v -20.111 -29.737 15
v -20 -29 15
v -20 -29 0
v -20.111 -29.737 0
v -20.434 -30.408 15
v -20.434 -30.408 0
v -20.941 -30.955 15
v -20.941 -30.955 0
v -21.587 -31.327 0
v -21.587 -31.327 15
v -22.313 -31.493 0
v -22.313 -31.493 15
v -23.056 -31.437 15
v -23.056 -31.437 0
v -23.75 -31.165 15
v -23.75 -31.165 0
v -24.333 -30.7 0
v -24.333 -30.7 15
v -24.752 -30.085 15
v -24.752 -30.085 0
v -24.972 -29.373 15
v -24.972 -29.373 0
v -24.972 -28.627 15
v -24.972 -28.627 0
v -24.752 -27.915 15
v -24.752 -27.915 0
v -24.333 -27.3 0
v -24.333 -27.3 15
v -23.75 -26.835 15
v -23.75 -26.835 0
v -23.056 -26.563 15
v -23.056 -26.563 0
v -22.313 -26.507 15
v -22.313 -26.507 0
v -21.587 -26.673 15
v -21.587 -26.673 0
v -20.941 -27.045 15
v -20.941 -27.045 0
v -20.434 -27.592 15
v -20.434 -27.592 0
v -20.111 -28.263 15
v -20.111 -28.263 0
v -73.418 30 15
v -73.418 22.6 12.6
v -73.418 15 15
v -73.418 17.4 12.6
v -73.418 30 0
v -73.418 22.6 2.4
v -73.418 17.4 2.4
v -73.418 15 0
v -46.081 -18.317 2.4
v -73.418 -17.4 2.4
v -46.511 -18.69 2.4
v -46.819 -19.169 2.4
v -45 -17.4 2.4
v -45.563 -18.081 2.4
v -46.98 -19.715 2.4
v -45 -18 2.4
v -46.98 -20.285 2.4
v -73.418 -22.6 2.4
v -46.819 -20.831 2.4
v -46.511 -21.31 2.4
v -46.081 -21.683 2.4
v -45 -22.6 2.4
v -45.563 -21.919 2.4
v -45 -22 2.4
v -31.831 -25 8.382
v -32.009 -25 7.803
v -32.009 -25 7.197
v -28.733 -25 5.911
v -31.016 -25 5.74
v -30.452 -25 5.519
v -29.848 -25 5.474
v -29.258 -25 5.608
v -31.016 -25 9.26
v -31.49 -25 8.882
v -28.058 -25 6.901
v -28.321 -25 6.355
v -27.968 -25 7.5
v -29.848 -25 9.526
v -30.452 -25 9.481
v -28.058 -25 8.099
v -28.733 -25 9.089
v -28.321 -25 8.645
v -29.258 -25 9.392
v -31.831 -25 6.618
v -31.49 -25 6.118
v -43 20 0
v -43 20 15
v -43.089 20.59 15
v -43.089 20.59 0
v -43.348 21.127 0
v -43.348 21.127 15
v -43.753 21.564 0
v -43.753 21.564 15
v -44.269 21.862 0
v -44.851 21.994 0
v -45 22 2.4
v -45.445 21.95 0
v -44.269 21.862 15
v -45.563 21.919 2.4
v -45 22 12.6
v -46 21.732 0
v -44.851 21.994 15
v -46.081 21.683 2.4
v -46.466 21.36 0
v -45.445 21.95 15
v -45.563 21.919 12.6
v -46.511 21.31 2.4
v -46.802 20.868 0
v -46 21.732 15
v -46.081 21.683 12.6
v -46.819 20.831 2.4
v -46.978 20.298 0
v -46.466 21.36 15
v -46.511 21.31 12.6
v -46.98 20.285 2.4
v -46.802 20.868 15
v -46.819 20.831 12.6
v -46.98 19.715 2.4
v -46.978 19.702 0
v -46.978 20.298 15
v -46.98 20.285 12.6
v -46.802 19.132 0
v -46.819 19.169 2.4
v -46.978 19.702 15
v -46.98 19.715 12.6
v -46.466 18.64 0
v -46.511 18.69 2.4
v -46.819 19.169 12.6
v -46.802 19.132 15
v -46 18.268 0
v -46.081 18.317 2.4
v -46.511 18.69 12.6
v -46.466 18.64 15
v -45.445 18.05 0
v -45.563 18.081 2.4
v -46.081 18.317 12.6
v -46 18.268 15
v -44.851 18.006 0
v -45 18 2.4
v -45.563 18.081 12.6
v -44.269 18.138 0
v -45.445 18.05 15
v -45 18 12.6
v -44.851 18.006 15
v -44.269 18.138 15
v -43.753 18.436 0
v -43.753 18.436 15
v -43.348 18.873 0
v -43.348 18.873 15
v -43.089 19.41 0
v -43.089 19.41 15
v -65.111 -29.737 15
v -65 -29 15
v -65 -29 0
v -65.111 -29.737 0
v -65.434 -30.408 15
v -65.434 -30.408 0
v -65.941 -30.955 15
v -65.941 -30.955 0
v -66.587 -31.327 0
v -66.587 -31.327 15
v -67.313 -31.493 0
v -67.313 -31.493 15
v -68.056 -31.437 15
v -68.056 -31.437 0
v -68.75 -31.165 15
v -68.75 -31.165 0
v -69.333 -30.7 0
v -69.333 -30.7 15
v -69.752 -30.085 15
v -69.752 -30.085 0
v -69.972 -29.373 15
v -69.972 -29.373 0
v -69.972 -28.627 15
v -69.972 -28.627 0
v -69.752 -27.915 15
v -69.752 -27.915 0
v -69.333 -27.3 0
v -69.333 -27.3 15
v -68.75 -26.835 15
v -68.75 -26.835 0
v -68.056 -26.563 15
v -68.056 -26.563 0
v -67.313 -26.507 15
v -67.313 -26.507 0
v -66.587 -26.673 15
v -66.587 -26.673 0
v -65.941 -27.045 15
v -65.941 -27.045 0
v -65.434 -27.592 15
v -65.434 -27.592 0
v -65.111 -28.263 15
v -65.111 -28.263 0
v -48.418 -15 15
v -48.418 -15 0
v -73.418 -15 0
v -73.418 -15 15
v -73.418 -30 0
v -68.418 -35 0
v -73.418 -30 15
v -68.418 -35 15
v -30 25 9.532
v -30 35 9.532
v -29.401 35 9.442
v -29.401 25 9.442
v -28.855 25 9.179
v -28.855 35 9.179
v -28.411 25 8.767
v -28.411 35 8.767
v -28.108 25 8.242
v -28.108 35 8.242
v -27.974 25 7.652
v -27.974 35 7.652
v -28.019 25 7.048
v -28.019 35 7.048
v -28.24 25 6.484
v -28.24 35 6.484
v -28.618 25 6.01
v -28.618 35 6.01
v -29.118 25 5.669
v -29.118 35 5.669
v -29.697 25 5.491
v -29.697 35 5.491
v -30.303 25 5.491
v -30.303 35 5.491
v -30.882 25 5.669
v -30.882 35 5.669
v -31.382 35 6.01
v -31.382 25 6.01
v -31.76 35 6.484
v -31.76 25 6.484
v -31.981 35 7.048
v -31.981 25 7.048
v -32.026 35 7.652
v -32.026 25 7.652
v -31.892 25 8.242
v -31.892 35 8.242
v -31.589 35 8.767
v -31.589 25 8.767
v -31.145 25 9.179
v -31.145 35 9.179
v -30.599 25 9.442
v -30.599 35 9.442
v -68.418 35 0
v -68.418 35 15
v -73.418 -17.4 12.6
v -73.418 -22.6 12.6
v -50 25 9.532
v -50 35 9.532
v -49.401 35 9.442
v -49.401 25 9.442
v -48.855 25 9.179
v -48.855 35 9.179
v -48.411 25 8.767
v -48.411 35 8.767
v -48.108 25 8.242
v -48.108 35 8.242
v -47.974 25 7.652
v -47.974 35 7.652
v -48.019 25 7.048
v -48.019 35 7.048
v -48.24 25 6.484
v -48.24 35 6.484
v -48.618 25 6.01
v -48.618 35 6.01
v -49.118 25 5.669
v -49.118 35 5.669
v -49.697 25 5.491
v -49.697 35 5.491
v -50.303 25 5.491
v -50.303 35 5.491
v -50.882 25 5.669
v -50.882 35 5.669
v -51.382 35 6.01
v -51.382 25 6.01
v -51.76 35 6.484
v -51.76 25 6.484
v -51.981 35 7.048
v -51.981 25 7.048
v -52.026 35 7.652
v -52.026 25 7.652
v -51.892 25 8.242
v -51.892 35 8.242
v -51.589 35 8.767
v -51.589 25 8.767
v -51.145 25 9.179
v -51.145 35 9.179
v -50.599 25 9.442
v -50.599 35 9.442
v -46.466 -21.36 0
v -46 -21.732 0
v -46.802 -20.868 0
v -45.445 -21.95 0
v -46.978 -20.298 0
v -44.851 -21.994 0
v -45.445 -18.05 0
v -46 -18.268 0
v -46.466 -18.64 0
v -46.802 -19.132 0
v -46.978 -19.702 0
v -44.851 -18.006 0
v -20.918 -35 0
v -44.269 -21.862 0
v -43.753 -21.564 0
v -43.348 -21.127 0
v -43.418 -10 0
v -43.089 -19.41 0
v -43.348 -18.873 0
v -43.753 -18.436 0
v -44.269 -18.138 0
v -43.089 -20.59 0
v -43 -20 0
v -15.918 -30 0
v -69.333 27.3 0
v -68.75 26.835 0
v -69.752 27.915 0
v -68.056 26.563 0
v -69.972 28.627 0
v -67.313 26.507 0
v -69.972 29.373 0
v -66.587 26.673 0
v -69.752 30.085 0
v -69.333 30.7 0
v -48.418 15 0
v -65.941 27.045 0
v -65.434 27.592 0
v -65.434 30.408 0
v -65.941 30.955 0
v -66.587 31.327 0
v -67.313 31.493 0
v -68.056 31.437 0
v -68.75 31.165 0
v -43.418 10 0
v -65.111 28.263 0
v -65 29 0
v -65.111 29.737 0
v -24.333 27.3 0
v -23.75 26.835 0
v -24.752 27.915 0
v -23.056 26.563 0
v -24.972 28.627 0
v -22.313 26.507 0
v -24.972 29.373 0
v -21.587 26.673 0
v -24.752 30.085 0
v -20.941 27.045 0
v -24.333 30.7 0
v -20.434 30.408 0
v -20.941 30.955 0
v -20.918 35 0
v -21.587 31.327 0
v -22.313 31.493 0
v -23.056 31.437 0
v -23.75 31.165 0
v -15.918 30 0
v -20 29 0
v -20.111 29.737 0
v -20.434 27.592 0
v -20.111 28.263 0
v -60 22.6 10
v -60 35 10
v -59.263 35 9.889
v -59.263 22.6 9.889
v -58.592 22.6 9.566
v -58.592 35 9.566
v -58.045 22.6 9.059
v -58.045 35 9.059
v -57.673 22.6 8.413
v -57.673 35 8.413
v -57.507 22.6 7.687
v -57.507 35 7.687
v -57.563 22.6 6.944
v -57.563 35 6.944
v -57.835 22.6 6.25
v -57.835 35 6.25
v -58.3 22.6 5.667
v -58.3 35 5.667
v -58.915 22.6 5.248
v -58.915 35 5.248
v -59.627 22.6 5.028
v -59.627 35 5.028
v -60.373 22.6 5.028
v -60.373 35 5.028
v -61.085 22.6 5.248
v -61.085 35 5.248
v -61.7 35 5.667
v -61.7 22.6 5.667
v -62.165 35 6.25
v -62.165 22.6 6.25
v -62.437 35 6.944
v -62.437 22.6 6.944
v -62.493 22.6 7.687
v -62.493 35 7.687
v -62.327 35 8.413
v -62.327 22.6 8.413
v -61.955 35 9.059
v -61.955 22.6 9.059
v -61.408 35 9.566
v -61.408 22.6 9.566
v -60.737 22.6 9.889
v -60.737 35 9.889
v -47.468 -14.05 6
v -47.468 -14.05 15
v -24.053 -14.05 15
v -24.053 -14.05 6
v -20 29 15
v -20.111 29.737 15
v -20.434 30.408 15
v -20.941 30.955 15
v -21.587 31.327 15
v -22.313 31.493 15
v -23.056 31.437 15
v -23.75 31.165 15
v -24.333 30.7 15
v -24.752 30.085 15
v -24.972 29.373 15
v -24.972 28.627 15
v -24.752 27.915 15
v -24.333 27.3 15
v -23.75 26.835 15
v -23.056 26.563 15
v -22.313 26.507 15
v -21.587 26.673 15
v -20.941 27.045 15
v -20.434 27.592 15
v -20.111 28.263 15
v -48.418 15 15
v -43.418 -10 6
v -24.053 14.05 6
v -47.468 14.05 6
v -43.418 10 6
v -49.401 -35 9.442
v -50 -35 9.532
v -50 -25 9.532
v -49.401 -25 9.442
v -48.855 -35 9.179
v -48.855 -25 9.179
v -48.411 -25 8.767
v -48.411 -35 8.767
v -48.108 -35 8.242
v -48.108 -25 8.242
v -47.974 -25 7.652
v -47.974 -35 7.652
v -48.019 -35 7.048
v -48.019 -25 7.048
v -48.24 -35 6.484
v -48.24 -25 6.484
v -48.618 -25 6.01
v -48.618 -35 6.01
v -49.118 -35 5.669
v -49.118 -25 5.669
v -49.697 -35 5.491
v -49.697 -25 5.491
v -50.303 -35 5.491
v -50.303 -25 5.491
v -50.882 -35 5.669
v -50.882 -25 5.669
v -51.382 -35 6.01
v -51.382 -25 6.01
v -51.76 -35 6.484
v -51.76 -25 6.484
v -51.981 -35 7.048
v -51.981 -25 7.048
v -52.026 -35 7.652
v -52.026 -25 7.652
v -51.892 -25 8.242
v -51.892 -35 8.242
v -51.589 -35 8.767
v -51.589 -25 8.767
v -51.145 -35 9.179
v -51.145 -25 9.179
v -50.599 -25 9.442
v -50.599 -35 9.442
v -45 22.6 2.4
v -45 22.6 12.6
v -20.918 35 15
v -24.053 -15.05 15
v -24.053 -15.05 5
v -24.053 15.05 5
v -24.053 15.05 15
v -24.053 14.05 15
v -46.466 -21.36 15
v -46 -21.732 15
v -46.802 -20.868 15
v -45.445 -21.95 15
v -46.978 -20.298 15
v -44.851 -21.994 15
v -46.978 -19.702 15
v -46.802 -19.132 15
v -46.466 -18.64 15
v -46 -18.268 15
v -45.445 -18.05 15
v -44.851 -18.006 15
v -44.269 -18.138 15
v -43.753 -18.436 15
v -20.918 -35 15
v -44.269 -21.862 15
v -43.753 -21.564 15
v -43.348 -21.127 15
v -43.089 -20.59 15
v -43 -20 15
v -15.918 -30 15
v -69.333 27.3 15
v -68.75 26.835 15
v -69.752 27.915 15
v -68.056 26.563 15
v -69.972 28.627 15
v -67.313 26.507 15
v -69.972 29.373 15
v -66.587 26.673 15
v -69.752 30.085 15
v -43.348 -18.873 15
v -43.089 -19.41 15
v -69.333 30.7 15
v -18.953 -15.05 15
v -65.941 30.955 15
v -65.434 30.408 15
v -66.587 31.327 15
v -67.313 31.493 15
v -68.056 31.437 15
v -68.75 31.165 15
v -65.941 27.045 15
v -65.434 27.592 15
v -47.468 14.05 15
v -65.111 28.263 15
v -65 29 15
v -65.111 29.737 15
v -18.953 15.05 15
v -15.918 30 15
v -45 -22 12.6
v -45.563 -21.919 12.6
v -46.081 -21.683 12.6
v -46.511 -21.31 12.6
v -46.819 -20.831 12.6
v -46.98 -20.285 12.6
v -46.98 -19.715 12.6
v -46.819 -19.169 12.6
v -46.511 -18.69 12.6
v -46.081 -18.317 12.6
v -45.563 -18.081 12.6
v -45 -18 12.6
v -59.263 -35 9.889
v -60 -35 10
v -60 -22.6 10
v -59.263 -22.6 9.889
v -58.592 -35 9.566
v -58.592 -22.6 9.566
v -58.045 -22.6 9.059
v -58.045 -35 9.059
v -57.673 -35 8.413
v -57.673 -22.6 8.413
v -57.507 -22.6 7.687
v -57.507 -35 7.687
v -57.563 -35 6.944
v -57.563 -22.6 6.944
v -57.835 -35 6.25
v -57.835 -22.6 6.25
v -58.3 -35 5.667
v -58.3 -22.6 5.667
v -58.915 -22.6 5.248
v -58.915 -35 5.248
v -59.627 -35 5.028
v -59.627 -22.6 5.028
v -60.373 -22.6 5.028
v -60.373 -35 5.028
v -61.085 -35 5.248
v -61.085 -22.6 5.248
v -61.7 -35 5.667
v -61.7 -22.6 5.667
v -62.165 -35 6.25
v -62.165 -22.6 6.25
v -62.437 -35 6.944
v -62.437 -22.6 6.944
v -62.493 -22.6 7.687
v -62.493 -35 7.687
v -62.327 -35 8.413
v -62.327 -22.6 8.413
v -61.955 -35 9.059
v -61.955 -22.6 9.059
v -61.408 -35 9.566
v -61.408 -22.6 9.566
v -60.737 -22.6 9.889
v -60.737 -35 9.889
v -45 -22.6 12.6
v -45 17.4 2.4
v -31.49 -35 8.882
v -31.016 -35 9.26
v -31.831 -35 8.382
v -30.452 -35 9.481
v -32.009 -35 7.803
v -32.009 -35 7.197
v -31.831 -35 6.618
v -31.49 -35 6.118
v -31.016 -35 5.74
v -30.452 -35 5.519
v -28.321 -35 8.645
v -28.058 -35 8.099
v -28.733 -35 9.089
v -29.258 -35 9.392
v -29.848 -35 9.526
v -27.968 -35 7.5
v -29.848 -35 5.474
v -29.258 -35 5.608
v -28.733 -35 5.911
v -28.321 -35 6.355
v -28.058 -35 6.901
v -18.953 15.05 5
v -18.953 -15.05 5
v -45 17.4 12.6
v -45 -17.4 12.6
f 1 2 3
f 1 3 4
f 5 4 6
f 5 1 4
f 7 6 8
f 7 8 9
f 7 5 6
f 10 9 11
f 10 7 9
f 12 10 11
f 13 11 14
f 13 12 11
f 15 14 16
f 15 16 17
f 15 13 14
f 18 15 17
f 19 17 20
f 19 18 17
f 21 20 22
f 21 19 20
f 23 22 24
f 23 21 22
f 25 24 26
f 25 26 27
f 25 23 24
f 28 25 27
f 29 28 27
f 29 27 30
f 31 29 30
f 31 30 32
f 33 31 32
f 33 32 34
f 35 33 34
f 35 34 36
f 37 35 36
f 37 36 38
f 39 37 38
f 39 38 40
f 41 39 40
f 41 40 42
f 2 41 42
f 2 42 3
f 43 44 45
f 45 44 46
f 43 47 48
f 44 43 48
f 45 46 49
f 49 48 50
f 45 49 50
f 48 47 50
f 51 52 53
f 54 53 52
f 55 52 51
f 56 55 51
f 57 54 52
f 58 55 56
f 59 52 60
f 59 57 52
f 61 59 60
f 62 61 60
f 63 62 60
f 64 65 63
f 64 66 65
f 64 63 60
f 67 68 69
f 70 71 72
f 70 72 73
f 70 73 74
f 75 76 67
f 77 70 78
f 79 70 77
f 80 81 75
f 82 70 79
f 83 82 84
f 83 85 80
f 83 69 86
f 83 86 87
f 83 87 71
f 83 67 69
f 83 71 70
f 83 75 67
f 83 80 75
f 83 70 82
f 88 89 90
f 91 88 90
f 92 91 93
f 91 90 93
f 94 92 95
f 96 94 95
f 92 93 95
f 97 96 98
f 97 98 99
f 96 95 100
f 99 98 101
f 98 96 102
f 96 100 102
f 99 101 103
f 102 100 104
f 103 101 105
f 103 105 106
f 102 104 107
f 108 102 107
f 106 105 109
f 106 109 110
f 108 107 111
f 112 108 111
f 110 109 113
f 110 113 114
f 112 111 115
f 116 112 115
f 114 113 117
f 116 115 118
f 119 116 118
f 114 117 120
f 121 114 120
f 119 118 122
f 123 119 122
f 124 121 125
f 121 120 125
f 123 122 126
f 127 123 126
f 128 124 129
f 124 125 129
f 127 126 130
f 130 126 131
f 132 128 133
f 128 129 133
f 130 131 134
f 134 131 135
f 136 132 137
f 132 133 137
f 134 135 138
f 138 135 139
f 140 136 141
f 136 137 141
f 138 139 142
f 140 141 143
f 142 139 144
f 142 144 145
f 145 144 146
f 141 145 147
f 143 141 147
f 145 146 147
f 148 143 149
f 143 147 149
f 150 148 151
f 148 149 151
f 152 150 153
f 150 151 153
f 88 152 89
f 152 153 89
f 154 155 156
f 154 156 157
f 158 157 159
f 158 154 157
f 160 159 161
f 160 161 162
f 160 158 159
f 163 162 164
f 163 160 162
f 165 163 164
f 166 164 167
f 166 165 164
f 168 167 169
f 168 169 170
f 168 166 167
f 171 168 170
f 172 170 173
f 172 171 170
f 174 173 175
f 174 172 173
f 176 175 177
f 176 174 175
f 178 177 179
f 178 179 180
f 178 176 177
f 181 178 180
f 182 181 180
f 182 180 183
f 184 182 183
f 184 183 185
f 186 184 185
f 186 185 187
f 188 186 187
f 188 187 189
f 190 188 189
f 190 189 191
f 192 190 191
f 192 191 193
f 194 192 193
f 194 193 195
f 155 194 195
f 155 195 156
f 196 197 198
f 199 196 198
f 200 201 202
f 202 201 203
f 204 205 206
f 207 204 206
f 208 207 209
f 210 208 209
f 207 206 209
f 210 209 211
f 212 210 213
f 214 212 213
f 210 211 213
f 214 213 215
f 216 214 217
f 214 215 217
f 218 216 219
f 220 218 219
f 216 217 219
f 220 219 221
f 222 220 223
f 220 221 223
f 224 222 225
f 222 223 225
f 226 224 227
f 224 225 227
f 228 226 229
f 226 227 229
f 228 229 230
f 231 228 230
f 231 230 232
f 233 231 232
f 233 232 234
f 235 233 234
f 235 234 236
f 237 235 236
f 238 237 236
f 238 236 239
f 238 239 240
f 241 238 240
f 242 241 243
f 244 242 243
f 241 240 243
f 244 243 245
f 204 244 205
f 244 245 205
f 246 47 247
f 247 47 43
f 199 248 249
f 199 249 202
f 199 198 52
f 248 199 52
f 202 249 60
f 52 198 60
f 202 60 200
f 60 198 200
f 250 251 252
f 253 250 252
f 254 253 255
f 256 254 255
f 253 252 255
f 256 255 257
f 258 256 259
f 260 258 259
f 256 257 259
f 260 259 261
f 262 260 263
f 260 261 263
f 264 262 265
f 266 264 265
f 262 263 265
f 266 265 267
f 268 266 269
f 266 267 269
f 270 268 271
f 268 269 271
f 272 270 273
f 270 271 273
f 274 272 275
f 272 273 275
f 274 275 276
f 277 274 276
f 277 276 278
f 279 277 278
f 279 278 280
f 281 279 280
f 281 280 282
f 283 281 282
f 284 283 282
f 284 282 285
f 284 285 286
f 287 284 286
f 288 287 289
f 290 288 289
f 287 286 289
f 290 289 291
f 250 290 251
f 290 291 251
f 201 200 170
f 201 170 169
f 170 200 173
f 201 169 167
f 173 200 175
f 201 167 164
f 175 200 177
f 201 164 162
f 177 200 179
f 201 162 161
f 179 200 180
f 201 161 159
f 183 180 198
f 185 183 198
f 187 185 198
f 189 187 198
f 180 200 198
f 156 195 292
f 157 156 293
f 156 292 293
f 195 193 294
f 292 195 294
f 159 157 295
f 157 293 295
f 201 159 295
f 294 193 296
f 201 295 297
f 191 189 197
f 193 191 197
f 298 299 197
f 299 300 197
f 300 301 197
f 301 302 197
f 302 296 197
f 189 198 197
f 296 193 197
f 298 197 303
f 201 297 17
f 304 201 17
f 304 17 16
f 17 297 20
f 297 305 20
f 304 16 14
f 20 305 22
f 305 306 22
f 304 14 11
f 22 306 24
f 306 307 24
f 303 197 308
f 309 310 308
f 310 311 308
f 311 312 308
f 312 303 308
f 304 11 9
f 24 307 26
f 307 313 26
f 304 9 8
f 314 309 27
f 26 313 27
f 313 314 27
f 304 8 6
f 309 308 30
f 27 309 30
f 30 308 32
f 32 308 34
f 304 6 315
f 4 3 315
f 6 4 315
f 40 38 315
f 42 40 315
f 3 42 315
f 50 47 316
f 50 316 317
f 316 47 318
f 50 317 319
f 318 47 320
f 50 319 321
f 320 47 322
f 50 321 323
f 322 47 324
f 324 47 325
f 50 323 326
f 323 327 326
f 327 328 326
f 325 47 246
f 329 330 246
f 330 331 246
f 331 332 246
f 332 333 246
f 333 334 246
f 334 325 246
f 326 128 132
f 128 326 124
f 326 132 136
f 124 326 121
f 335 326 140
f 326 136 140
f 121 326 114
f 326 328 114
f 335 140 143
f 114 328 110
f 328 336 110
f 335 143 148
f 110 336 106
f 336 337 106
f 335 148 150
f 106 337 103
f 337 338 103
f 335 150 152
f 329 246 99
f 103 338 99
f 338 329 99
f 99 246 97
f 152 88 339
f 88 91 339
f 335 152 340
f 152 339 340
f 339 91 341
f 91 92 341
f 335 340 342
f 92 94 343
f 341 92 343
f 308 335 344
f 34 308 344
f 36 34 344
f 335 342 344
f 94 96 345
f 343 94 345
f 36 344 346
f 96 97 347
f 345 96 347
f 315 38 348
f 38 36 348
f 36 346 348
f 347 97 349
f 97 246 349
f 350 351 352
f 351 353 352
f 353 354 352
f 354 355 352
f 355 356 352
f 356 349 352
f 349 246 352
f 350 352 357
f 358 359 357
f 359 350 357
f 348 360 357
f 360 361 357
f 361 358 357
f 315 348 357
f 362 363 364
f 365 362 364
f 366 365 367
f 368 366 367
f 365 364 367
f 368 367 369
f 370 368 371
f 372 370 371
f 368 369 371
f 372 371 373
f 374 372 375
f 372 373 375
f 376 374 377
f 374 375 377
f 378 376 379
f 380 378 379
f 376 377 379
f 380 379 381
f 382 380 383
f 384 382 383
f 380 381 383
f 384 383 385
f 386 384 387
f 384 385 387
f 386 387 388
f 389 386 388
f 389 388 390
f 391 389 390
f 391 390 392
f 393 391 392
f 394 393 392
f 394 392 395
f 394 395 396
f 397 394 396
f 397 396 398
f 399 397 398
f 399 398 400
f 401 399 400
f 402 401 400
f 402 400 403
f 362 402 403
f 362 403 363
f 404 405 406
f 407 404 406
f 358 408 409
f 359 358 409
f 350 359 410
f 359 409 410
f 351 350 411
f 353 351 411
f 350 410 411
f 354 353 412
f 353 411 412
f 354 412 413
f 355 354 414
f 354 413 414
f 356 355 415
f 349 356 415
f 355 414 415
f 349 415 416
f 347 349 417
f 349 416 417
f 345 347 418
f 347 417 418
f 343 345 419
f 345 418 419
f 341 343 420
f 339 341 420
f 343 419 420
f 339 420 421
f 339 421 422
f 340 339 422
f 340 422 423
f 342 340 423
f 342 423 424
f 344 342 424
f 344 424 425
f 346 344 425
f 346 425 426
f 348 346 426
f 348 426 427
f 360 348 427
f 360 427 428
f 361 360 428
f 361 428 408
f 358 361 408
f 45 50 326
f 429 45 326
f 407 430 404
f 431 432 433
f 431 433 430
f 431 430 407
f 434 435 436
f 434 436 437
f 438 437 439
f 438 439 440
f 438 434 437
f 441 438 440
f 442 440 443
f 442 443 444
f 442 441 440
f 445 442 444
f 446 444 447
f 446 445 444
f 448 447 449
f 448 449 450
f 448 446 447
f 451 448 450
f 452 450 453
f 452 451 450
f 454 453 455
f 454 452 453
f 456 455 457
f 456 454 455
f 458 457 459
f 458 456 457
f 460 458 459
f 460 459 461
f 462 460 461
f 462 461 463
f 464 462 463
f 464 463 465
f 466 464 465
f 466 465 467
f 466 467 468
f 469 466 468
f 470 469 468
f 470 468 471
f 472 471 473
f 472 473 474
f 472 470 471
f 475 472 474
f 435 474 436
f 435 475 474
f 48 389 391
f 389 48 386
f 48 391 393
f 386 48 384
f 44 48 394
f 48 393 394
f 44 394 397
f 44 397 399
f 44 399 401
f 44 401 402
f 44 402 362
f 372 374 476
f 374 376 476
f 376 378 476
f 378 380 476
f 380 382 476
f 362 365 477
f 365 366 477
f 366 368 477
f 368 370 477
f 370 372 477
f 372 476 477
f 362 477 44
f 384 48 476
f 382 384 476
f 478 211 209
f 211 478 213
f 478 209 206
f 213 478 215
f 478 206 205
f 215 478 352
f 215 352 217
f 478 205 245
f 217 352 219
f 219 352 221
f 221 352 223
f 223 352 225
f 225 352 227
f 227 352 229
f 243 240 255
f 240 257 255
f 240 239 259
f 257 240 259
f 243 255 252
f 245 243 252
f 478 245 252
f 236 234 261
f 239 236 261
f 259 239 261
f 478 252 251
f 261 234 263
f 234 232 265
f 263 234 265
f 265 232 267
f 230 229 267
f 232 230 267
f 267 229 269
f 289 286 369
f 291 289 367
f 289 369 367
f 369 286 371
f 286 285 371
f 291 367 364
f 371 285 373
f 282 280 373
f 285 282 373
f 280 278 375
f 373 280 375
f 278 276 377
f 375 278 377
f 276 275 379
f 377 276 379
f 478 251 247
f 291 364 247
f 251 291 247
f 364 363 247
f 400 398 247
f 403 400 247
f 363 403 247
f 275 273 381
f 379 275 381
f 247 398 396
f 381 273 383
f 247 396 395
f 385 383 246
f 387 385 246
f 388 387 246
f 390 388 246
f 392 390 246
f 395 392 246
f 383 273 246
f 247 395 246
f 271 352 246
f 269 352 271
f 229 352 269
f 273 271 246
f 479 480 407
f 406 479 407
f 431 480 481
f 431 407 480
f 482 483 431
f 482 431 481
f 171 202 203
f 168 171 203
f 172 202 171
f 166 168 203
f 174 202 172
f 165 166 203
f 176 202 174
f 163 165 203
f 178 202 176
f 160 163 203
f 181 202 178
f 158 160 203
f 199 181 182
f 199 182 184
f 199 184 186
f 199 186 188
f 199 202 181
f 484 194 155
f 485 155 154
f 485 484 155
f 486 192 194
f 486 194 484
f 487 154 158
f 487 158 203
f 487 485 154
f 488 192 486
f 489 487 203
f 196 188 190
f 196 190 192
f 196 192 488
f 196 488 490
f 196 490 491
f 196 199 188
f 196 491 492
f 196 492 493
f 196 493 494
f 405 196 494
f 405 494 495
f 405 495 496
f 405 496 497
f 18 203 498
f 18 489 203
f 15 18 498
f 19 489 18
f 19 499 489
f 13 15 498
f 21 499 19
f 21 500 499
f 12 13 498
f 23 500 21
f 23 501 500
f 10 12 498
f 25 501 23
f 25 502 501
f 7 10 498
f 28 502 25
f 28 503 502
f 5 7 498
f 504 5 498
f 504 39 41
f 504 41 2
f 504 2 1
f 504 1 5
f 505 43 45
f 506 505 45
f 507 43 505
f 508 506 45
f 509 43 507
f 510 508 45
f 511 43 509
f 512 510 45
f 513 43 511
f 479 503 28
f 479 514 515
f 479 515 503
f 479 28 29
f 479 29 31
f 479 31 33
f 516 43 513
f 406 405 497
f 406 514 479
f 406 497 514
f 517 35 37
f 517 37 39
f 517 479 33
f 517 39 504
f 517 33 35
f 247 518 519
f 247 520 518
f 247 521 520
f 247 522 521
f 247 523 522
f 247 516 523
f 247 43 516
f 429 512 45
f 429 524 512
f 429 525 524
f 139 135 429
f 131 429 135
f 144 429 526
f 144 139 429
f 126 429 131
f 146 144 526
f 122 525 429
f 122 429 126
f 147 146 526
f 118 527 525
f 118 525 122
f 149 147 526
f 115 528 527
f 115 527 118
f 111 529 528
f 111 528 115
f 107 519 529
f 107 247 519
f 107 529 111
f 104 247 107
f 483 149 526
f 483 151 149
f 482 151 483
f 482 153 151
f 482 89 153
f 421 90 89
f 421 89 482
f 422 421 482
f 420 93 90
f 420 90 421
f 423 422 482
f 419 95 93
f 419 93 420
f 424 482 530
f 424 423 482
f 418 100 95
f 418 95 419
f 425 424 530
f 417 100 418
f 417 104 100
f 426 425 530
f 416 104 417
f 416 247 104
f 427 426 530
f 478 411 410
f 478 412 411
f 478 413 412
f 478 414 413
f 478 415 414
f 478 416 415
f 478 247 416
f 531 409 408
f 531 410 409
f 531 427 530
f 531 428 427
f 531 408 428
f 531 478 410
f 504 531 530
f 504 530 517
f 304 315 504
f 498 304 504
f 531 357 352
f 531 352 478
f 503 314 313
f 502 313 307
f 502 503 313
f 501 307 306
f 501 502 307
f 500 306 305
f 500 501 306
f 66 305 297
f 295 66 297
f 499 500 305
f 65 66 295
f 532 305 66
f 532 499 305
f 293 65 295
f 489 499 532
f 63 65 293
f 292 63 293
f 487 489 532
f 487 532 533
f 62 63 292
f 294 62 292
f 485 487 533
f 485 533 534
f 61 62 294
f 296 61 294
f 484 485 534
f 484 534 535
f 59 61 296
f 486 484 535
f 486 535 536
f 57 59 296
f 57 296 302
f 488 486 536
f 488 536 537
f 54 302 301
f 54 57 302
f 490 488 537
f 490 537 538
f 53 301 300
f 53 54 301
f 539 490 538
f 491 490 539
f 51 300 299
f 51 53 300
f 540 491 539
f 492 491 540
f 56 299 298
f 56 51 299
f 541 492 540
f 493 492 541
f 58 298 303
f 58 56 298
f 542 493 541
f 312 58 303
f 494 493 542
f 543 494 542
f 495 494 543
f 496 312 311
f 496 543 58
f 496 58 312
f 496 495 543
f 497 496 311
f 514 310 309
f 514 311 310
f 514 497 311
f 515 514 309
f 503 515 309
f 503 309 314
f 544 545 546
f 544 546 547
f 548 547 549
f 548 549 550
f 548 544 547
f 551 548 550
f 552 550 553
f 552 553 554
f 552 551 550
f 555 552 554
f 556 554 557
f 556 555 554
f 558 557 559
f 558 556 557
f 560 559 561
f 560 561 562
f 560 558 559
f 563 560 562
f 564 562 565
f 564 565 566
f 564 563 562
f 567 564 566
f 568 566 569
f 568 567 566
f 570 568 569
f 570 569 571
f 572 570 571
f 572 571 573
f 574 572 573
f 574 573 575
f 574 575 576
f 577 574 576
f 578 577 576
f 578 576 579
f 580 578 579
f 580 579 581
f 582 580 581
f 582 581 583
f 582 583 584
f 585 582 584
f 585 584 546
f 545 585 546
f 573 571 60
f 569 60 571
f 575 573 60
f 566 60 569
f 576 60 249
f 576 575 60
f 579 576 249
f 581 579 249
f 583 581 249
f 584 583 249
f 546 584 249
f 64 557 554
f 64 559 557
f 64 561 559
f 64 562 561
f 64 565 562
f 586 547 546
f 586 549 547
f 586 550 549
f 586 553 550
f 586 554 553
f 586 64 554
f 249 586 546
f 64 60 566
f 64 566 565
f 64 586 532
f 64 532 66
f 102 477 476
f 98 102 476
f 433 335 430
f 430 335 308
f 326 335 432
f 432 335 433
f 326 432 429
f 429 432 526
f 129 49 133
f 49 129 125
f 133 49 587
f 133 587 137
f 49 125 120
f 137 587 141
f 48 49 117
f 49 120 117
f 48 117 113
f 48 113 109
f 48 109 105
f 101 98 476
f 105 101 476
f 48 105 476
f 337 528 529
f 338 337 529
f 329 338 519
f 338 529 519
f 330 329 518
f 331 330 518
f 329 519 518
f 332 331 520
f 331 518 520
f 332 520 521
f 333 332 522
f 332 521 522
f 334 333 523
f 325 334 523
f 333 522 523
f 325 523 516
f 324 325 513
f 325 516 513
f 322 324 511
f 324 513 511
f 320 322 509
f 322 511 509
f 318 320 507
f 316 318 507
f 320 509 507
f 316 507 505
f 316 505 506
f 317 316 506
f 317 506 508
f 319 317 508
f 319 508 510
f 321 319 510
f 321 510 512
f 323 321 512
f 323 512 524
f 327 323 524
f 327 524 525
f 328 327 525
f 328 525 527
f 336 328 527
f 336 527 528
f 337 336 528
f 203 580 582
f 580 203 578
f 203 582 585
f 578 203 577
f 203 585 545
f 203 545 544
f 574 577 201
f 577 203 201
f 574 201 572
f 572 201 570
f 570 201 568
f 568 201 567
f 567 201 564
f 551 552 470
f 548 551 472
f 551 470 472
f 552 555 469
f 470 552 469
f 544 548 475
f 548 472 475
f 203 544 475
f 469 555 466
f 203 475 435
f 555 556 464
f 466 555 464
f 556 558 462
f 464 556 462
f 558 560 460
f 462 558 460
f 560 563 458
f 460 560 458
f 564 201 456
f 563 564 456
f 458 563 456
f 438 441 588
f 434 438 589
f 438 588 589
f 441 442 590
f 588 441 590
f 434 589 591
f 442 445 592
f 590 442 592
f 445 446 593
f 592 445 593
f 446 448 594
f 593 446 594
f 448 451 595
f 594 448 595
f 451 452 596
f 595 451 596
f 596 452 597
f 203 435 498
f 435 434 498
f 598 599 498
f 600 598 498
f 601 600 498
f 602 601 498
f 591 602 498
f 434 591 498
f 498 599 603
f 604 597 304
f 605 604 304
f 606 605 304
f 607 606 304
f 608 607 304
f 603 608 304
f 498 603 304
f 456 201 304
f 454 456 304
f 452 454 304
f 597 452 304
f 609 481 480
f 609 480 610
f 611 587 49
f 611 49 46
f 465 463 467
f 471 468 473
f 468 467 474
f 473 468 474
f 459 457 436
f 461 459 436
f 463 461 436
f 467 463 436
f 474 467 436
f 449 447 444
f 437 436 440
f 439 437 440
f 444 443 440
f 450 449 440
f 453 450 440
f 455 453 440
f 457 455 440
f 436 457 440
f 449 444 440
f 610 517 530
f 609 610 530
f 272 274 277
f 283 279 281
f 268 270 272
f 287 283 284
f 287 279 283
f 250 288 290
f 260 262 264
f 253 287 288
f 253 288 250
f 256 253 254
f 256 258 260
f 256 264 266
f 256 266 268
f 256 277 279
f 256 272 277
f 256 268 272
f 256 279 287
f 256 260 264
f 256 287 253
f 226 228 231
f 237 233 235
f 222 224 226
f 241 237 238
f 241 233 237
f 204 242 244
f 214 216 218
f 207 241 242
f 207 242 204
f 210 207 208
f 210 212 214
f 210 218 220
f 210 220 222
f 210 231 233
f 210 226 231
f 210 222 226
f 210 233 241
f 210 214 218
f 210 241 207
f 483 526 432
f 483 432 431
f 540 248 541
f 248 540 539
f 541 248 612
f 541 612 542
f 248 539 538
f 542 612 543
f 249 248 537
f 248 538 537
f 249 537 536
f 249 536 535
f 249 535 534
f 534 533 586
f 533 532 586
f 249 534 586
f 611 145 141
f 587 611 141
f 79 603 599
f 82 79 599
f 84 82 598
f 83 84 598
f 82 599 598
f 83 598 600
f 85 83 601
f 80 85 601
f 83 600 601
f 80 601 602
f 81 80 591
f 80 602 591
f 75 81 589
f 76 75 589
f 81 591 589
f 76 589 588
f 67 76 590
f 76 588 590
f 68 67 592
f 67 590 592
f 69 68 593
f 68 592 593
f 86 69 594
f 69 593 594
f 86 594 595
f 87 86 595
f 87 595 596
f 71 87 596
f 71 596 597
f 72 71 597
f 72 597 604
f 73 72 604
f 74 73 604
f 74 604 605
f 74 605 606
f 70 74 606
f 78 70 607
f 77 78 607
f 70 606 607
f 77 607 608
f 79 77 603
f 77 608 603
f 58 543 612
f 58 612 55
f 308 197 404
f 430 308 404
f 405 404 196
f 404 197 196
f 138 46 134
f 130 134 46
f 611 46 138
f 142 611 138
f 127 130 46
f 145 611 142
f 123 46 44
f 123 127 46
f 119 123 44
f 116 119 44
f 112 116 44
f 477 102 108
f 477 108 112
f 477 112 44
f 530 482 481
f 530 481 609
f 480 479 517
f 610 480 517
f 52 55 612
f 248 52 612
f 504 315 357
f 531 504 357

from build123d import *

# Parameters (mm, degrees)
EXTRUDE_2_DEPTH          = 15
CHAMFER_1_SIZE           = 5
CUT_EXTRUDE_START        = -13.418191
SKETCH_16_W              = 10.2
SKETCH_16_H              = 5.2
CUT_EXTRUDE_11_DEPTH     = 13.418191
SKETCH_17_W              = 10.2
SKETCH_17_H              = 5.2
CUT_EXTRUDE_12_DEPTH     = 15
SKETCH_19_R              = 2
CUT_EXTRUDE_13_DEPTH     = 83.70568747
CUT_EXTRUDE_14_REACH     = 104.544
SKETCH_21_R              = 2.5
SKETCH_24_R              = 2.032005788
CUT_EXTRUDE_16_DEPTH     = 10
PATTERN_LINEAR_1_COUNT   = 2
PATTERN_LINEAR_1_PITCH   = 20
CUT_EXTRUDE_20_REACH     = 84.706
SKETCH_31_R              = 2.5
MIRROR_1_COPY_1_SKETCH_R = 2.032005788
MIRROR_1_COPY_1_DEPTH    = 10
SKETCH_28_W              = 5.1
SKETCH_28_H              = 30.1
CUT_EXTRUDE_18_DEPTH     = 10
SKETCH_29_W              = 33.808551472
SKETCH_29_H              = 28.1
CUT_EXTRUDE_19_DEPTH     = 9


with BuildPart() as part:
    # 草圖1 → 填料-伸長2 (new body)
    with BuildSketch(Plane.XY):
        Polygon((-15.918190797, 35), (-73.418190797, 35), (-73.418190797, 15), (-43.418190797, 15), (-43.418190797, -15), (-73.418190797, -15), (-73.418190797, -35), (-15.918190797, -35), align=None)
    extrude(amount=EXTRUDE_2_DEPTH)

    # 導角1
    chamfer_1_edges = [part.edges().sort_by_distance(p)[0] for p in [
        (-73.418190797, 35, 7.5),
        (-15.918190797, 35, 7.5),
        (-15.918190797, -35, 7.5),
        (-73.418190797, -35, 7.5),
        (-43.418190797, -15, 7.5),
        (-43.418190797, 15, 7.5),
    ]]
    chamfer(chamfer_1_edges, length=CHAMFER_1_SIZE)

    # 草圖16 → 除料-伸長11 (cut)
    with BuildSketch(Plane.ZY.offset(73.418190797).offset(CUT_EXTRUDE_START)):
        with Locations((7.5, 20)):
            Rectangle(SKETCH_16_W, SKETCH_16_H)
    cut_extrude_11 = extrude(amount=CUT_EXTRUDE_11_DEPTH, mode=Mode.SUBTRACT)

    # 草圖17 → 除料-伸長12 (cut)
    with BuildSketch(Plane(origin=(-60, 0, 0), x_dir=(0, 0, -1), z_dir=(1, 0, 0))):
        with Locations((-7.5, 20)):
            Rectangle(SKETCH_17_W, SKETCH_17_H)
    cut_extrude_12 = extrude(amount=CUT_EXTRUDE_12_DEPTH, mode=Mode.SUBTRACT)

    # 草圖19 → 除料-伸長13 (cut, through all)
    with BuildSketch(Plane.XY.offset(15)):
        with Locations((-45, 20)):
            Circle(SKETCH_19_R)
    cut_extrude_13 = extrude(amount=-CUT_EXTRUDE_13_DEPTH, mode=Mode.SUBTRACT)

    # 草圖21 → 除料-伸長14 (cut, up to next)
    with BuildSketch(Plane(origin=(0, 35, 0), x_dir=(1, 0, 0), z_dir=(0, 1, 0)), mode=Mode.PRIVATE) as cut_extrude_14_sk1:
        with Locations(Location((-60, -7.5, 0), (0, 0, 270))):
            Circle(SKETCH_21_R)
    cut_extrude_14_tool1 = extrude(cut_extrude_14_sk1.sketch, amount=-CUT_EXTRUDE_14_REACH, mode=Mode.PRIVATE) & part.part
    cut_extrude_14 = cut_extrude_14_tool1.solids().sort_by_distance((-60, 35, 7.5))[0]
    add(cut_extrude_14, mode=Mode.SUBTRACT)

    # 草圖24 → 除料-伸長16 (cut)
    with BuildSketch(Plane(origin=(0, 35, 0), x_dir=(1, 0, 0), z_dir=(0, 1, 0))):
        with Locations(Location((-50, -7.5, 0), (0, 0, 270))):
            Circle(SKETCH_24_R)
    cut_extrude_16 = extrude(amount=-CUT_EXTRUDE_16_DEPTH, mode=Mode.SUBTRACT)

    # 直線複製排列1: 除料-伸長16 ×2
    with Locations(*[(i * PATTERN_LINEAR_1_PITCH, 0, 0) for i in range(1, PATTERN_LINEAR_1_COUNT)]):
        add(cut_extrude_16, mode=Mode.SUBTRACT)

    # 草圖31 → 除料-伸長20 (cut, up to next)
    with BuildSketch(Plane.XY.offset(15), mode=Mode.PRIVATE) as cut_extrude_20_sk1:
        with Locations((-22.5, 29)):
            Circle(SKETCH_31_R)
    cut_extrude_20_tool1 = extrude(cut_extrude_20_sk1.sketch, amount=-CUT_EXTRUDE_20_REACH, mode=Mode.PRIVATE) & part.part
    # 草圖31 → 除料-伸長20 (cut, up to next)
    with BuildSketch(Plane.XY.offset(15), mode=Mode.PRIVATE) as cut_extrude_20_sk2:
        with Locations((-67.5, 29)):
            Circle(SKETCH_31_R)
    cut_extrude_20_tool2 = extrude(cut_extrude_20_sk2.sketch, amount=-CUT_EXTRUDE_20_REACH, mode=Mode.PRIVATE) & part.part
    cut_extrude_20_1 = cut_extrude_20_tool1.solids().sort_by_distance((-22.5, 29, 15))[0]
    add(cut_extrude_20_1, mode=Mode.SUBTRACT)
    cut_extrude_20_2 = cut_extrude_20_tool2.solids().sort_by_distance((-67.5, 29, 15))[0]
    add(cut_extrude_20_2, mode=Mode.SUBTRACT)
    cut_extrude_20 = cut_extrude_20_1 + cut_extrude_20_2  # 除料-伸長20 as one shape, for the pattern or mirror that repeats it

    # 鏡射1: 除料-伸長11, 除料-伸長12, 除料-伸長13, 除料-伸長14, 除料-伸長16, 除料-伸長20 across plane
    add(cut_extrude_11.mirror(Plane.ZX), mode=Mode.SUBTRACT)
    add(cut_extrude_12.mirror(Plane.ZX), mode=Mode.SUBTRACT)
    add(cut_extrude_13.mirror(Plane.ZX), mode=Mode.SUBTRACT)
    add(cut_extrude_14.mirror(Plane.ZX), mode=Mode.SUBTRACT)
    add(cut_extrude_16.mirror(Plane.ZX), mode=Mode.SUBTRACT)
    add(cut_extrude_20.mirror(Plane.ZX), mode=Mode.SUBTRACT)

    # 鏡射1 copy 1 sketch → 鏡射1 copy 1 (cut)
    with BuildSketch(Plane(origin=(20, -35, 0), x_dir=(1, 0, 0), z_dir=(0, -1, 0))):
        with Locations((-50, 7.5)):
            Circle(MIRROR_1_COPY_1_SKETCH_R)
    extrude(amount=-MIRROR_1_COPY_1_DEPTH, mode=Mode.SUBTRACT)

    # 草圖28 → 除料-伸長18 (cut)
    with BuildSketch(Plane.XY.offset(15)):
        with Locations((-21.502726402, 0)):
            Rectangle(SKETCH_28_W, SKETCH_28_H)
    extrude(amount=-CUT_EXTRUDE_18_DEPTH, mode=Mode.SUBTRACT)

    # 草圖29 → 除料-伸長19 (cut)
    with BuildSketch(Plane.XY.offset(15)):
        with Locations((-40.957002138, 0)):
            Rectangle(SKETCH_29_W, SKETCH_29_H)
    extrude(amount=-CUT_EXTRUDE_19_DEPTH, mode=Mode.SUBTRACT)


solid = part.part
